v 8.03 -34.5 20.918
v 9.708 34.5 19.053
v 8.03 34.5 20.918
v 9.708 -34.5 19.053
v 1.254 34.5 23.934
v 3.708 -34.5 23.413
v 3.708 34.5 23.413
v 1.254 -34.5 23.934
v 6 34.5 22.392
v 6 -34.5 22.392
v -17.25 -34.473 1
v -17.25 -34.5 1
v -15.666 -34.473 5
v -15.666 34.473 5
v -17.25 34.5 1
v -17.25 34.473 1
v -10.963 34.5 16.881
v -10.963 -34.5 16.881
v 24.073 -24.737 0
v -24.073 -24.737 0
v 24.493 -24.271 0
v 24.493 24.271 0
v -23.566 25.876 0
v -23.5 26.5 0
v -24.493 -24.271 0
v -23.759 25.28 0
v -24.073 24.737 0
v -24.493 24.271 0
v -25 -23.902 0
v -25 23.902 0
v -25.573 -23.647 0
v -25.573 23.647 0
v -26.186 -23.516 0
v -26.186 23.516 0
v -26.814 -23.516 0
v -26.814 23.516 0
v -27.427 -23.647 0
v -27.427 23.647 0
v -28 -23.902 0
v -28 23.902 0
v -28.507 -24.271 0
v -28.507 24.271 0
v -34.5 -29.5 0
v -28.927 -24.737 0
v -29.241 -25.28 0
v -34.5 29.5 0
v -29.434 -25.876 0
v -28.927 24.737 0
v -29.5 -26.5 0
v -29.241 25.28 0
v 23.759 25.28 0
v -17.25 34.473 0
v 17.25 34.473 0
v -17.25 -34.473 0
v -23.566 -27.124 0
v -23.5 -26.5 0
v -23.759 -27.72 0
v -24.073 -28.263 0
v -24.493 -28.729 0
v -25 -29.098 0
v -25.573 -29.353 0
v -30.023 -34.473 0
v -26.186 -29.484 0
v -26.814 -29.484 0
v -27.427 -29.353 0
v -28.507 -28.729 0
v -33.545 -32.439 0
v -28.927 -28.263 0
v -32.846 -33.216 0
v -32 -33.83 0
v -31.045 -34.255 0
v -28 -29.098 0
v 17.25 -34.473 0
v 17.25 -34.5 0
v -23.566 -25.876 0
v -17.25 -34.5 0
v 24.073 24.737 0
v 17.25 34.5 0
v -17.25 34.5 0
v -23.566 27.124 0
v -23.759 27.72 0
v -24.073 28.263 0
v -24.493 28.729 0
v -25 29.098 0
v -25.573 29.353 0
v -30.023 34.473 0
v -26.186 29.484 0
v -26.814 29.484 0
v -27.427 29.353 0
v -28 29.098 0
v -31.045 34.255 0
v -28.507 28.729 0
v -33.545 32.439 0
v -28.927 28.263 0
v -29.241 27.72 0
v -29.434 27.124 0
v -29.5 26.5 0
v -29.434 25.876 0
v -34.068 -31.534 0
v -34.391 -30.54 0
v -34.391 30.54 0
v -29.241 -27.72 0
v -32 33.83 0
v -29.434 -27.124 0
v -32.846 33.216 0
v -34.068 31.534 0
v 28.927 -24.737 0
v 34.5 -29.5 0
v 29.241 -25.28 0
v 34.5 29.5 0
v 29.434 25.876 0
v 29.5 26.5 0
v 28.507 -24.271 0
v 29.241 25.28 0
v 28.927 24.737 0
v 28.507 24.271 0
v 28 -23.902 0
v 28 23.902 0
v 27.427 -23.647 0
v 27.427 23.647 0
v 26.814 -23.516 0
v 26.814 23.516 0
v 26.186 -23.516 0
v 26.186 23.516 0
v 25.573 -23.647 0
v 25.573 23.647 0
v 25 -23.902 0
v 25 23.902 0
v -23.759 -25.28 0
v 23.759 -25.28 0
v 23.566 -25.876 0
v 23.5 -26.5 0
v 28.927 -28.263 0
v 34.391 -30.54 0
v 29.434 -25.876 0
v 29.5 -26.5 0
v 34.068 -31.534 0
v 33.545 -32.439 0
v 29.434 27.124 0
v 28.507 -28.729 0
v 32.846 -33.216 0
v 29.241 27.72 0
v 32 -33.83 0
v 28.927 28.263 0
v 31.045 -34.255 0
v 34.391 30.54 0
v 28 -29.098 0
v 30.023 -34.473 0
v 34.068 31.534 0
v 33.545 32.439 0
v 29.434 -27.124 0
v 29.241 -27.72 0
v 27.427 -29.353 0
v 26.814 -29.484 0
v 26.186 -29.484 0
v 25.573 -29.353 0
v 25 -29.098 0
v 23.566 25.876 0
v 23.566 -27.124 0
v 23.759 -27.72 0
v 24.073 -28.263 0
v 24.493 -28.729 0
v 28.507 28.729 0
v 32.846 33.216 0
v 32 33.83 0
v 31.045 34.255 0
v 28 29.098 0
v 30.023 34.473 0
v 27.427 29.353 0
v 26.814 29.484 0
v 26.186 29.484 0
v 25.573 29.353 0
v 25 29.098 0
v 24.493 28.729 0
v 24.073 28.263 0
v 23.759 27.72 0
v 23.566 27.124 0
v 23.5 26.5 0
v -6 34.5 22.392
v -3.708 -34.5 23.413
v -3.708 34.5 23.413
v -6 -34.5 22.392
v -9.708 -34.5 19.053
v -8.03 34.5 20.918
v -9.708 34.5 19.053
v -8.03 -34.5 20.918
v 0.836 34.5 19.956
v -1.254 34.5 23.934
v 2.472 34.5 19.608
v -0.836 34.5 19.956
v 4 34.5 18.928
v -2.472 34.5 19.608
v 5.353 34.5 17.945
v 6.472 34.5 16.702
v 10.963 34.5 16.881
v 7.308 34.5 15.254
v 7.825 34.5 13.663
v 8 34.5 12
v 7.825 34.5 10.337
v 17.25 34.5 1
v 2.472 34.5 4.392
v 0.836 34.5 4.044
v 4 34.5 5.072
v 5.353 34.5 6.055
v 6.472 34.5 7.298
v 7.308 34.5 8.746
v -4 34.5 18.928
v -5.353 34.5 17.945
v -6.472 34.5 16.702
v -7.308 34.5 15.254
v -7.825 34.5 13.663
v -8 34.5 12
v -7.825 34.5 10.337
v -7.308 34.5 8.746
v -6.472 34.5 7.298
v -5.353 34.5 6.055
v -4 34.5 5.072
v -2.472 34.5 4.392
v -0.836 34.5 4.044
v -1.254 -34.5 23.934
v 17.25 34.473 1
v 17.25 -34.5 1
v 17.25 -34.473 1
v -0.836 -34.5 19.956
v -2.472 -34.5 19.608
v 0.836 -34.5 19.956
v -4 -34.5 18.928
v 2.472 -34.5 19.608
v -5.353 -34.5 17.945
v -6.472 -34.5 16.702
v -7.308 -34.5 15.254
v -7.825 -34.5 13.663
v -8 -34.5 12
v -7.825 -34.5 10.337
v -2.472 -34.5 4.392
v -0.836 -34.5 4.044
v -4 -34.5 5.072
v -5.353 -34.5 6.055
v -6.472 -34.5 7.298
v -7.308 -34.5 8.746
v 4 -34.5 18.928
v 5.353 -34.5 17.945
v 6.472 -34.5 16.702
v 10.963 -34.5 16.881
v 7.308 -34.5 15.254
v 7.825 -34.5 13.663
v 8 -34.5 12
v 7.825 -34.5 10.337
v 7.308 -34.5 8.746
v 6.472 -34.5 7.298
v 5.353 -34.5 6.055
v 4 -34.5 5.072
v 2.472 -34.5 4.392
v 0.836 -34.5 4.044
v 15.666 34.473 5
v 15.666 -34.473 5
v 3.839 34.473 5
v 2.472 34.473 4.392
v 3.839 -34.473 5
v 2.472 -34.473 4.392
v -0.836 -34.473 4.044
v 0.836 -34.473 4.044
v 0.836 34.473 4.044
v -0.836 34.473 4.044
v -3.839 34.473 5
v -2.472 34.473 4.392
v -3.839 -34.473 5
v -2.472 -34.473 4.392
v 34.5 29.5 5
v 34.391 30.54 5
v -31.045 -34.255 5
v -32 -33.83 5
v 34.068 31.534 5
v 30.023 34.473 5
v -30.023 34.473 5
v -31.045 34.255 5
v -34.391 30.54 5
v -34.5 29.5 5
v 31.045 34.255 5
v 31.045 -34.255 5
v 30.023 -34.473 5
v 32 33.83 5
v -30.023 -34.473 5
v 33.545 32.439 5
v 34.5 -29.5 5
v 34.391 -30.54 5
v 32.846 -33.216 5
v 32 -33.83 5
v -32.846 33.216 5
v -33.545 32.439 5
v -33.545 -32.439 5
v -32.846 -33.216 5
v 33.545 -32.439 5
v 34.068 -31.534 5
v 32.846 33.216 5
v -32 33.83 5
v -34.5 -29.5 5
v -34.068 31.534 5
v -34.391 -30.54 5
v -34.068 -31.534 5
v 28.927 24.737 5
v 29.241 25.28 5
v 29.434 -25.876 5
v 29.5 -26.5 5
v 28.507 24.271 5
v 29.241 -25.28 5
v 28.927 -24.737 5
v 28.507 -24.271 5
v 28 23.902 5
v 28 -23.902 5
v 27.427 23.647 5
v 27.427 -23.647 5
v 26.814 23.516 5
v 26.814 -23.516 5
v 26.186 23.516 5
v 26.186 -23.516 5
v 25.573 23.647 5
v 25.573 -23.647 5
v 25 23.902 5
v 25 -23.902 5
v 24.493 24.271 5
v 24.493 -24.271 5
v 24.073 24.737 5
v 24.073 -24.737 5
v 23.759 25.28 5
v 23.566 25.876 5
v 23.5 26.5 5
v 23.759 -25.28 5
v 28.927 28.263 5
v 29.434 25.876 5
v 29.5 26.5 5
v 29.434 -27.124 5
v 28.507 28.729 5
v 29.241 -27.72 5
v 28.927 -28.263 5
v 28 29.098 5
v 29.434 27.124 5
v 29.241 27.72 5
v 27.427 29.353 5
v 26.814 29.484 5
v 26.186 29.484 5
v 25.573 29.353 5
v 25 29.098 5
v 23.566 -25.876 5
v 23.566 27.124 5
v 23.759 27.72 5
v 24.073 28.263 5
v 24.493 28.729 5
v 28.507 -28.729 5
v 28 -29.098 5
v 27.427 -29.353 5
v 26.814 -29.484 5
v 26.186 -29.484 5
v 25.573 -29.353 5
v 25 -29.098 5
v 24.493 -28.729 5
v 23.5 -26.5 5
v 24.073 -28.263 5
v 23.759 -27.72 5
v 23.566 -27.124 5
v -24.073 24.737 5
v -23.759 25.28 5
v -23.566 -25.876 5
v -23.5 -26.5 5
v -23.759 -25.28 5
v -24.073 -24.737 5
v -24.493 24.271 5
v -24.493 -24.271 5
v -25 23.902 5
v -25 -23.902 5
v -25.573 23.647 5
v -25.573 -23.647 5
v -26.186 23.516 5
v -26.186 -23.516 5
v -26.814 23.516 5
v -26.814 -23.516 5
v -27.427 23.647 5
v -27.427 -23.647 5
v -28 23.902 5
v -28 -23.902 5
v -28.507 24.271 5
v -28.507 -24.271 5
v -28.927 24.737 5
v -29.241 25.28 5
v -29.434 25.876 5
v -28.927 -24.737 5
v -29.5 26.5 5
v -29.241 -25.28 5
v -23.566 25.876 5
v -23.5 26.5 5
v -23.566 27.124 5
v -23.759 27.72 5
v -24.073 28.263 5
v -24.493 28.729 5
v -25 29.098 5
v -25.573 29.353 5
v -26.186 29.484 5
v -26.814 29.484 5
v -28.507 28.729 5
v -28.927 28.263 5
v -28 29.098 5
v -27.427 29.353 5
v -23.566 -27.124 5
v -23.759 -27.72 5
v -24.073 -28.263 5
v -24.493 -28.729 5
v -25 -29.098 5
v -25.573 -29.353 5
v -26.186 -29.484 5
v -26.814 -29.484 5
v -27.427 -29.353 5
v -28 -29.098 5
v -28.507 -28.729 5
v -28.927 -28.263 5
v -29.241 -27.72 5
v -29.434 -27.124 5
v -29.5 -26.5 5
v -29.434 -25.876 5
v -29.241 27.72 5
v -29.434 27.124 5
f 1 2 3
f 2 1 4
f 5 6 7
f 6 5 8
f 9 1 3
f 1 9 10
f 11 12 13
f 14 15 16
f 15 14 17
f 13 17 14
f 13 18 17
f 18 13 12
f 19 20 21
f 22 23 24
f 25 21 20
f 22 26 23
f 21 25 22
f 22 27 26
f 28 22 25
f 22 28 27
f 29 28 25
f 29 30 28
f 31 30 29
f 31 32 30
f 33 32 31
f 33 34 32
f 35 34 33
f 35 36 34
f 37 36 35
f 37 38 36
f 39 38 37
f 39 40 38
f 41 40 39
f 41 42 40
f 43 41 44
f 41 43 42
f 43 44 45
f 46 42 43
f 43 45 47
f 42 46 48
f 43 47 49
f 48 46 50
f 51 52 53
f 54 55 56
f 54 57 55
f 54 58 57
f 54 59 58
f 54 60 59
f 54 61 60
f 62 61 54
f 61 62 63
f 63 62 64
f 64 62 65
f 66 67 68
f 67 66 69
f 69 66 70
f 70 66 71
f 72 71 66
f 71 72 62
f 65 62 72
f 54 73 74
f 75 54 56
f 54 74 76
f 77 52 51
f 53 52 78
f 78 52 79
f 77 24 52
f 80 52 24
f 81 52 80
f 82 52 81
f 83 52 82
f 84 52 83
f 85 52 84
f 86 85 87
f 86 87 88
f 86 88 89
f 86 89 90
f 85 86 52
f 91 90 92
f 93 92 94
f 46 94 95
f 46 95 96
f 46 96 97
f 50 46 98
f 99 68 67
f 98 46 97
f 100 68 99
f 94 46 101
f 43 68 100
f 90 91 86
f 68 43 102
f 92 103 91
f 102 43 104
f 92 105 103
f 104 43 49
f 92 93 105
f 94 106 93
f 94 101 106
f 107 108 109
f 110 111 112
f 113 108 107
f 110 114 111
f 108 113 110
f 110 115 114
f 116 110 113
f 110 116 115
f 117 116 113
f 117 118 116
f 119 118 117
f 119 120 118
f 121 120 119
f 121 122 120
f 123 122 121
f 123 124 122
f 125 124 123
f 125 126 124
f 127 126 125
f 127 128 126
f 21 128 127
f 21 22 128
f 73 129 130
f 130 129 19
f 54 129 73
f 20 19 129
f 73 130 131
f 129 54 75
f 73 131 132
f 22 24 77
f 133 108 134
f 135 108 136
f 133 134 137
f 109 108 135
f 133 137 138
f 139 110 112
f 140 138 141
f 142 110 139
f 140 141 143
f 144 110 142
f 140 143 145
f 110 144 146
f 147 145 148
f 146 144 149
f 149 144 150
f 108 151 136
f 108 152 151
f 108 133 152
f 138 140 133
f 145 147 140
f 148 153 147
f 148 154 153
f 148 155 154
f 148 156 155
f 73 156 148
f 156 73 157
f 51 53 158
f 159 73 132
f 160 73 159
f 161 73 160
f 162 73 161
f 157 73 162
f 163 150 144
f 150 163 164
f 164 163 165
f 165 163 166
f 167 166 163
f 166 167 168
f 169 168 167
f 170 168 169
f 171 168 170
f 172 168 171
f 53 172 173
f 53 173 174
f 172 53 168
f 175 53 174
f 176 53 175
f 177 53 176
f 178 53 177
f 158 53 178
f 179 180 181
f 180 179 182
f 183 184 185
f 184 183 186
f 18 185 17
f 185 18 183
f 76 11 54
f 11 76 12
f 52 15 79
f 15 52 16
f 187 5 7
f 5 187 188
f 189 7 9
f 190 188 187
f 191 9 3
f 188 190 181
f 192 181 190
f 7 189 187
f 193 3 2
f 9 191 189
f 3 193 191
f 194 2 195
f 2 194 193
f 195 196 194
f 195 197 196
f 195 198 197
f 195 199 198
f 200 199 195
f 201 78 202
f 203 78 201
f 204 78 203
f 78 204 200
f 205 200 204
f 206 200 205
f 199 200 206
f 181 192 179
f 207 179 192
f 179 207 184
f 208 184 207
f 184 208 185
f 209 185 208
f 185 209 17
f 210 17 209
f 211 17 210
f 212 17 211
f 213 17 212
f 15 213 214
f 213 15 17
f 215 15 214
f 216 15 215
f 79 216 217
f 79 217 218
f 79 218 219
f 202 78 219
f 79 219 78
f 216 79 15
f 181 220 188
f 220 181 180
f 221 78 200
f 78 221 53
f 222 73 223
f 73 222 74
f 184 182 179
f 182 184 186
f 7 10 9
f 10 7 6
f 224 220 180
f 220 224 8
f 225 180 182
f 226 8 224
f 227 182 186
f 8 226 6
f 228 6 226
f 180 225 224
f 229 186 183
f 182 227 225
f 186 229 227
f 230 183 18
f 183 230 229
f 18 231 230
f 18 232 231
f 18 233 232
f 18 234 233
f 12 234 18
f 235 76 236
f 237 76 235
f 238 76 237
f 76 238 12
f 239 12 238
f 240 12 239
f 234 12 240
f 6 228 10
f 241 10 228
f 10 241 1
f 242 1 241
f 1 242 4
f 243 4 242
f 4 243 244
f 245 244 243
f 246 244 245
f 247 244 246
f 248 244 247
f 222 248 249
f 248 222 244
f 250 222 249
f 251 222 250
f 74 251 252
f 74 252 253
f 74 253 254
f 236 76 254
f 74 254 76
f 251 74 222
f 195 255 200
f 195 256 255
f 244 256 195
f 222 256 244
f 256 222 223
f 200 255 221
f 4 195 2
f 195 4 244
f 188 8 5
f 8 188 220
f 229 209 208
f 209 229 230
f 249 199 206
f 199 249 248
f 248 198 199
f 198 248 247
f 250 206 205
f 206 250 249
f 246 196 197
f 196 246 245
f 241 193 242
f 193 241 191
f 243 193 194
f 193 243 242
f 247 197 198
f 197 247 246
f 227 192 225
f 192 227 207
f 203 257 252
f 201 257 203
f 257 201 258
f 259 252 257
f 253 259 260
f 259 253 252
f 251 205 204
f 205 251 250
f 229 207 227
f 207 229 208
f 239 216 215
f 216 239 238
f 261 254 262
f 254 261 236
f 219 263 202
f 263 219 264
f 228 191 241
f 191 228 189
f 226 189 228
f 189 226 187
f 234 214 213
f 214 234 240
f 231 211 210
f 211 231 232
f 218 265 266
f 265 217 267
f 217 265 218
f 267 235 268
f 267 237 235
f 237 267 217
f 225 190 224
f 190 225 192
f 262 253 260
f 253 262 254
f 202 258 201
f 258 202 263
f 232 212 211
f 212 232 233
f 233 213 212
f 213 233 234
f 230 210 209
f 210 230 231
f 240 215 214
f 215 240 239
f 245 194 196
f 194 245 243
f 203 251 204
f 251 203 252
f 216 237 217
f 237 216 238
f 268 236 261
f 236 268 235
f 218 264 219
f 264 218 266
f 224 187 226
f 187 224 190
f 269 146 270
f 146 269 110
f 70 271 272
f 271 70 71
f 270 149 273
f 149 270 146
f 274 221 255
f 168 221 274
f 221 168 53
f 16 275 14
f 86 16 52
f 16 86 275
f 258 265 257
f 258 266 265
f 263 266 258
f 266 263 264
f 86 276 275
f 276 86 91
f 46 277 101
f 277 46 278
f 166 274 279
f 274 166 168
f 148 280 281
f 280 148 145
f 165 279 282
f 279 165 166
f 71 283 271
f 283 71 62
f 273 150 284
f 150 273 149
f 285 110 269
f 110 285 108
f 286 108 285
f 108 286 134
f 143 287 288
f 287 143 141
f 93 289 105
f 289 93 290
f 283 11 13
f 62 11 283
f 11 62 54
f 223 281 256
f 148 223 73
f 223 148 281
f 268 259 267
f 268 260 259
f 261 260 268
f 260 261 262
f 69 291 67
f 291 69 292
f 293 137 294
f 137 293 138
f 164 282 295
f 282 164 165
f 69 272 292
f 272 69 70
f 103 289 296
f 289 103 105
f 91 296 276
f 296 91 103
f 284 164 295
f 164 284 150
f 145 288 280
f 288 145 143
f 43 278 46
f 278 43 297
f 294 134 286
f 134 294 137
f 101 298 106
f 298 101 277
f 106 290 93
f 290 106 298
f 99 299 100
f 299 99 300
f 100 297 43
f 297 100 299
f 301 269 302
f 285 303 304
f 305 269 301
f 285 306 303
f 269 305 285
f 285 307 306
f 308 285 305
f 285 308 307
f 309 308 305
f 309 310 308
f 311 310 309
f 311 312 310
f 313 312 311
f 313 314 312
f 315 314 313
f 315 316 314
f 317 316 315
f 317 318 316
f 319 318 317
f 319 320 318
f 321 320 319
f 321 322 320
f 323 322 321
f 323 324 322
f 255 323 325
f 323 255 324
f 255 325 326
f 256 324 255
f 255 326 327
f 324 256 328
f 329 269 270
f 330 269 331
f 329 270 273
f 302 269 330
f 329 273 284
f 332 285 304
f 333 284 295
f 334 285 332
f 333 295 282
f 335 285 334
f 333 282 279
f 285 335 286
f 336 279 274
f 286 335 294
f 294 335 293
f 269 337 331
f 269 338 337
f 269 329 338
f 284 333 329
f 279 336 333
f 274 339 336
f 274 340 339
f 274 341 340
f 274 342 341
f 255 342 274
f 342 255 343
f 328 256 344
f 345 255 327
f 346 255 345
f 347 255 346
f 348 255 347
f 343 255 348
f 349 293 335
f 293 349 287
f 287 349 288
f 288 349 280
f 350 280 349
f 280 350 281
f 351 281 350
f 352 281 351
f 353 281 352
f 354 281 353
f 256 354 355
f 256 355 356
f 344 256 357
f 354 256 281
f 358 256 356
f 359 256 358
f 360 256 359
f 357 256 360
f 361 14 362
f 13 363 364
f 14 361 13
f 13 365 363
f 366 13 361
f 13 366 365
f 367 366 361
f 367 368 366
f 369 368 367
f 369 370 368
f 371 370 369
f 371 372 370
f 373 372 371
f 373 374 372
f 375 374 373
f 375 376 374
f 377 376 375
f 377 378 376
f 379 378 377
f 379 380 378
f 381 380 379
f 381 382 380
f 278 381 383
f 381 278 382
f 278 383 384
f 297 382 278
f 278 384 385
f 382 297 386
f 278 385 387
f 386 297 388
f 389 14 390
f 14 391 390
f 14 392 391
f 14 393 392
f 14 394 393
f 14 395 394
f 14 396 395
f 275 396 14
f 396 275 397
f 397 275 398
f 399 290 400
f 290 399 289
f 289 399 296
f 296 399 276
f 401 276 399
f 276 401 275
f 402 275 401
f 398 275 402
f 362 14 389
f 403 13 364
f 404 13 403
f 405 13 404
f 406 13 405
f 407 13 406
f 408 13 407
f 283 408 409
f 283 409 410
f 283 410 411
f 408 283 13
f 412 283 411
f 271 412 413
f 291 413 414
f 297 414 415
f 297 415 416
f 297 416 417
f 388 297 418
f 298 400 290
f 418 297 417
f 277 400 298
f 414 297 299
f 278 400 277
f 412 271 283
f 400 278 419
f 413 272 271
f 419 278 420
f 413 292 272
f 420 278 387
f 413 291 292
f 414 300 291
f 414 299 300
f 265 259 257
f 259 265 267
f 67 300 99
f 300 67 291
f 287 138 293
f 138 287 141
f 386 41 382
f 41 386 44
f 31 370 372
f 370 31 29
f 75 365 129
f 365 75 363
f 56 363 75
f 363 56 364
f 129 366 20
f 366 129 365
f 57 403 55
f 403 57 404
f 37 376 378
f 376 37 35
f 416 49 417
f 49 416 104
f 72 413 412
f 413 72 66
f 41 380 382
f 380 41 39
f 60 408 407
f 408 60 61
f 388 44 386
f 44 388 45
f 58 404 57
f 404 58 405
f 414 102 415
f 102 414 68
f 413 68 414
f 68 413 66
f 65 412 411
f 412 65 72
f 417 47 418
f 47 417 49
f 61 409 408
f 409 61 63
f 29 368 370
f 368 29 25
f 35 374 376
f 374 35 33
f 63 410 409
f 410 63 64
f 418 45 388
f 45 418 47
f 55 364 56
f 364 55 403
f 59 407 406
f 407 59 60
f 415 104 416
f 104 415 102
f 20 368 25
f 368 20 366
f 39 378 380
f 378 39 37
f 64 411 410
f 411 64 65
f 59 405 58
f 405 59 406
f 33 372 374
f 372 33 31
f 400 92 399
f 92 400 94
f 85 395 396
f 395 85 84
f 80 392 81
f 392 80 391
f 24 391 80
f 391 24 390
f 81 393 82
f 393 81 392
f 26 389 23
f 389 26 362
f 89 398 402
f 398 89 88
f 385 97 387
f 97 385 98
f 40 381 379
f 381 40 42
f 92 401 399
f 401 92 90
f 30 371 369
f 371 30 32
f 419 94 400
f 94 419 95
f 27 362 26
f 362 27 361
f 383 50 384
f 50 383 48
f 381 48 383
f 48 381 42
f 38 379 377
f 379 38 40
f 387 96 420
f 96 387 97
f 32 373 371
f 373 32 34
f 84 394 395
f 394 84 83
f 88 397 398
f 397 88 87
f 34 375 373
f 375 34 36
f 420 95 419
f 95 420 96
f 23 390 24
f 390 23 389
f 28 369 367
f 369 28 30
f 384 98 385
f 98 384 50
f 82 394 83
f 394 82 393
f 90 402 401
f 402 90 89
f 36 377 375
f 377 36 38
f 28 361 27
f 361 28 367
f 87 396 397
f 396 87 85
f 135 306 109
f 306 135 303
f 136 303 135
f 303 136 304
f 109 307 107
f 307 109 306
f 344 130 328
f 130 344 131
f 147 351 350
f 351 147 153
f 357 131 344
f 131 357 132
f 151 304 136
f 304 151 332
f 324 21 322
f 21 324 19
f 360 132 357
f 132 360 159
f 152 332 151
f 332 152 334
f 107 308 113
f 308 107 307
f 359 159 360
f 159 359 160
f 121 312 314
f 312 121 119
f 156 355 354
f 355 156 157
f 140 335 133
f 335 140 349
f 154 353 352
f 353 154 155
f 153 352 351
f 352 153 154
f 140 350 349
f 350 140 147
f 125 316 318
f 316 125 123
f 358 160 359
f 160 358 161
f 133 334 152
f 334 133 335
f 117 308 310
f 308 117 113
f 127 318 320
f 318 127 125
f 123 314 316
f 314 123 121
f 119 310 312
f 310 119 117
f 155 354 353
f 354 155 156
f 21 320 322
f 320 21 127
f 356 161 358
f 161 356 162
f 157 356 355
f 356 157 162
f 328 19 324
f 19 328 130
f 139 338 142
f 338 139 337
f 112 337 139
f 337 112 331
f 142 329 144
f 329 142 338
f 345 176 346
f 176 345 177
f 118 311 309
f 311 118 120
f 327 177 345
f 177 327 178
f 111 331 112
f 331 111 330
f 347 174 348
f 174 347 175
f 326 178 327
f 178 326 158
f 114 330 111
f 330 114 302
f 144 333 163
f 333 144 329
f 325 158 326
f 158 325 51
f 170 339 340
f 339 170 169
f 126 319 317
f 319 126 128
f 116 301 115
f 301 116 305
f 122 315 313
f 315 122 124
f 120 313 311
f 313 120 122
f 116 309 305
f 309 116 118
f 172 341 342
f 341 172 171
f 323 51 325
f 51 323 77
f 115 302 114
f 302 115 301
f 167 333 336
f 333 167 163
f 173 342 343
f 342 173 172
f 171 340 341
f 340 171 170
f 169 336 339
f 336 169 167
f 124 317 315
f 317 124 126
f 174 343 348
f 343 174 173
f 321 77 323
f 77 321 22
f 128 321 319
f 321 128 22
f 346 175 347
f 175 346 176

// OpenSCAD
MOUNT_HOLE_SPACING = 53;
MOUNT_HOLE_DIA = 6;

CORNER_DIA = 10;
WIDTH = MOUNT_HOLE_SPACING + MOUNT_HOLE_DIA + 10;
LENGTH = WIDTH * 2;
HEIGHT = 5;

POLE_DIA = 16;
POLE_MOUNT_DIA = POLE_DIA + 8;
POLE_MOUNT_WIDTH = WIDTH/2;
POLE_MOUNT_LENGTH = WIDTH;

$fn = 30;

module body() {
    hull() {
        for(i = [-1, 1]) {
            for(j = [-1, 1]) {
                translate([i * (WIDTH/2-CORNER_DIA/2), j * (WIDTH/2-CORNER_DIA/2)])
                    cylinder(d = CORNER_DIA, h = HEIGHT);
            }
        }
    }
}

module mounting_holes() {
    union() {
        for(i = [-1, 1]) {
            for(j = [-1, 1]) {
                translate([i * MOUNT_HOLE_SPACING/2, j * MOUNT_HOLE_SPACING/2])
                    cylinder(d = MOUNT_HOLE_DIA, h = HEIGHT);
            }
        }
    }
}

module pole_mount() {
    difference() {
        hull() {
            translate([0, -POLE_MOUNT_LENGTH/2, POLE_MOUNT_DIA/2])
                rotate([-90, 0, 0])
                    cylinder(d = POLE_MOUNT_DIA, h = POLE_MOUNT_LENGTH);
            translate([-POLE_MOUNT_WIDTH/2, -POLE_MOUNT_LENGTH/2, 0])
                cube(size = [POLE_MOUNT_WIDTH, POLE_MOUNT_LENGTH, 1]);
        }
        translate([0, -POLE_MOUNT_LENGTH/2, POLE_MOUNT_DIA/2])
            rotate([-90, 0, 0])
                cylinder(d = POLE_DIA, h = POLE_MOUNT_LENGTH);

    }
}

difference() {
    union() {
        body();
        pole_mount();
    }
    mounting_holes();
}
